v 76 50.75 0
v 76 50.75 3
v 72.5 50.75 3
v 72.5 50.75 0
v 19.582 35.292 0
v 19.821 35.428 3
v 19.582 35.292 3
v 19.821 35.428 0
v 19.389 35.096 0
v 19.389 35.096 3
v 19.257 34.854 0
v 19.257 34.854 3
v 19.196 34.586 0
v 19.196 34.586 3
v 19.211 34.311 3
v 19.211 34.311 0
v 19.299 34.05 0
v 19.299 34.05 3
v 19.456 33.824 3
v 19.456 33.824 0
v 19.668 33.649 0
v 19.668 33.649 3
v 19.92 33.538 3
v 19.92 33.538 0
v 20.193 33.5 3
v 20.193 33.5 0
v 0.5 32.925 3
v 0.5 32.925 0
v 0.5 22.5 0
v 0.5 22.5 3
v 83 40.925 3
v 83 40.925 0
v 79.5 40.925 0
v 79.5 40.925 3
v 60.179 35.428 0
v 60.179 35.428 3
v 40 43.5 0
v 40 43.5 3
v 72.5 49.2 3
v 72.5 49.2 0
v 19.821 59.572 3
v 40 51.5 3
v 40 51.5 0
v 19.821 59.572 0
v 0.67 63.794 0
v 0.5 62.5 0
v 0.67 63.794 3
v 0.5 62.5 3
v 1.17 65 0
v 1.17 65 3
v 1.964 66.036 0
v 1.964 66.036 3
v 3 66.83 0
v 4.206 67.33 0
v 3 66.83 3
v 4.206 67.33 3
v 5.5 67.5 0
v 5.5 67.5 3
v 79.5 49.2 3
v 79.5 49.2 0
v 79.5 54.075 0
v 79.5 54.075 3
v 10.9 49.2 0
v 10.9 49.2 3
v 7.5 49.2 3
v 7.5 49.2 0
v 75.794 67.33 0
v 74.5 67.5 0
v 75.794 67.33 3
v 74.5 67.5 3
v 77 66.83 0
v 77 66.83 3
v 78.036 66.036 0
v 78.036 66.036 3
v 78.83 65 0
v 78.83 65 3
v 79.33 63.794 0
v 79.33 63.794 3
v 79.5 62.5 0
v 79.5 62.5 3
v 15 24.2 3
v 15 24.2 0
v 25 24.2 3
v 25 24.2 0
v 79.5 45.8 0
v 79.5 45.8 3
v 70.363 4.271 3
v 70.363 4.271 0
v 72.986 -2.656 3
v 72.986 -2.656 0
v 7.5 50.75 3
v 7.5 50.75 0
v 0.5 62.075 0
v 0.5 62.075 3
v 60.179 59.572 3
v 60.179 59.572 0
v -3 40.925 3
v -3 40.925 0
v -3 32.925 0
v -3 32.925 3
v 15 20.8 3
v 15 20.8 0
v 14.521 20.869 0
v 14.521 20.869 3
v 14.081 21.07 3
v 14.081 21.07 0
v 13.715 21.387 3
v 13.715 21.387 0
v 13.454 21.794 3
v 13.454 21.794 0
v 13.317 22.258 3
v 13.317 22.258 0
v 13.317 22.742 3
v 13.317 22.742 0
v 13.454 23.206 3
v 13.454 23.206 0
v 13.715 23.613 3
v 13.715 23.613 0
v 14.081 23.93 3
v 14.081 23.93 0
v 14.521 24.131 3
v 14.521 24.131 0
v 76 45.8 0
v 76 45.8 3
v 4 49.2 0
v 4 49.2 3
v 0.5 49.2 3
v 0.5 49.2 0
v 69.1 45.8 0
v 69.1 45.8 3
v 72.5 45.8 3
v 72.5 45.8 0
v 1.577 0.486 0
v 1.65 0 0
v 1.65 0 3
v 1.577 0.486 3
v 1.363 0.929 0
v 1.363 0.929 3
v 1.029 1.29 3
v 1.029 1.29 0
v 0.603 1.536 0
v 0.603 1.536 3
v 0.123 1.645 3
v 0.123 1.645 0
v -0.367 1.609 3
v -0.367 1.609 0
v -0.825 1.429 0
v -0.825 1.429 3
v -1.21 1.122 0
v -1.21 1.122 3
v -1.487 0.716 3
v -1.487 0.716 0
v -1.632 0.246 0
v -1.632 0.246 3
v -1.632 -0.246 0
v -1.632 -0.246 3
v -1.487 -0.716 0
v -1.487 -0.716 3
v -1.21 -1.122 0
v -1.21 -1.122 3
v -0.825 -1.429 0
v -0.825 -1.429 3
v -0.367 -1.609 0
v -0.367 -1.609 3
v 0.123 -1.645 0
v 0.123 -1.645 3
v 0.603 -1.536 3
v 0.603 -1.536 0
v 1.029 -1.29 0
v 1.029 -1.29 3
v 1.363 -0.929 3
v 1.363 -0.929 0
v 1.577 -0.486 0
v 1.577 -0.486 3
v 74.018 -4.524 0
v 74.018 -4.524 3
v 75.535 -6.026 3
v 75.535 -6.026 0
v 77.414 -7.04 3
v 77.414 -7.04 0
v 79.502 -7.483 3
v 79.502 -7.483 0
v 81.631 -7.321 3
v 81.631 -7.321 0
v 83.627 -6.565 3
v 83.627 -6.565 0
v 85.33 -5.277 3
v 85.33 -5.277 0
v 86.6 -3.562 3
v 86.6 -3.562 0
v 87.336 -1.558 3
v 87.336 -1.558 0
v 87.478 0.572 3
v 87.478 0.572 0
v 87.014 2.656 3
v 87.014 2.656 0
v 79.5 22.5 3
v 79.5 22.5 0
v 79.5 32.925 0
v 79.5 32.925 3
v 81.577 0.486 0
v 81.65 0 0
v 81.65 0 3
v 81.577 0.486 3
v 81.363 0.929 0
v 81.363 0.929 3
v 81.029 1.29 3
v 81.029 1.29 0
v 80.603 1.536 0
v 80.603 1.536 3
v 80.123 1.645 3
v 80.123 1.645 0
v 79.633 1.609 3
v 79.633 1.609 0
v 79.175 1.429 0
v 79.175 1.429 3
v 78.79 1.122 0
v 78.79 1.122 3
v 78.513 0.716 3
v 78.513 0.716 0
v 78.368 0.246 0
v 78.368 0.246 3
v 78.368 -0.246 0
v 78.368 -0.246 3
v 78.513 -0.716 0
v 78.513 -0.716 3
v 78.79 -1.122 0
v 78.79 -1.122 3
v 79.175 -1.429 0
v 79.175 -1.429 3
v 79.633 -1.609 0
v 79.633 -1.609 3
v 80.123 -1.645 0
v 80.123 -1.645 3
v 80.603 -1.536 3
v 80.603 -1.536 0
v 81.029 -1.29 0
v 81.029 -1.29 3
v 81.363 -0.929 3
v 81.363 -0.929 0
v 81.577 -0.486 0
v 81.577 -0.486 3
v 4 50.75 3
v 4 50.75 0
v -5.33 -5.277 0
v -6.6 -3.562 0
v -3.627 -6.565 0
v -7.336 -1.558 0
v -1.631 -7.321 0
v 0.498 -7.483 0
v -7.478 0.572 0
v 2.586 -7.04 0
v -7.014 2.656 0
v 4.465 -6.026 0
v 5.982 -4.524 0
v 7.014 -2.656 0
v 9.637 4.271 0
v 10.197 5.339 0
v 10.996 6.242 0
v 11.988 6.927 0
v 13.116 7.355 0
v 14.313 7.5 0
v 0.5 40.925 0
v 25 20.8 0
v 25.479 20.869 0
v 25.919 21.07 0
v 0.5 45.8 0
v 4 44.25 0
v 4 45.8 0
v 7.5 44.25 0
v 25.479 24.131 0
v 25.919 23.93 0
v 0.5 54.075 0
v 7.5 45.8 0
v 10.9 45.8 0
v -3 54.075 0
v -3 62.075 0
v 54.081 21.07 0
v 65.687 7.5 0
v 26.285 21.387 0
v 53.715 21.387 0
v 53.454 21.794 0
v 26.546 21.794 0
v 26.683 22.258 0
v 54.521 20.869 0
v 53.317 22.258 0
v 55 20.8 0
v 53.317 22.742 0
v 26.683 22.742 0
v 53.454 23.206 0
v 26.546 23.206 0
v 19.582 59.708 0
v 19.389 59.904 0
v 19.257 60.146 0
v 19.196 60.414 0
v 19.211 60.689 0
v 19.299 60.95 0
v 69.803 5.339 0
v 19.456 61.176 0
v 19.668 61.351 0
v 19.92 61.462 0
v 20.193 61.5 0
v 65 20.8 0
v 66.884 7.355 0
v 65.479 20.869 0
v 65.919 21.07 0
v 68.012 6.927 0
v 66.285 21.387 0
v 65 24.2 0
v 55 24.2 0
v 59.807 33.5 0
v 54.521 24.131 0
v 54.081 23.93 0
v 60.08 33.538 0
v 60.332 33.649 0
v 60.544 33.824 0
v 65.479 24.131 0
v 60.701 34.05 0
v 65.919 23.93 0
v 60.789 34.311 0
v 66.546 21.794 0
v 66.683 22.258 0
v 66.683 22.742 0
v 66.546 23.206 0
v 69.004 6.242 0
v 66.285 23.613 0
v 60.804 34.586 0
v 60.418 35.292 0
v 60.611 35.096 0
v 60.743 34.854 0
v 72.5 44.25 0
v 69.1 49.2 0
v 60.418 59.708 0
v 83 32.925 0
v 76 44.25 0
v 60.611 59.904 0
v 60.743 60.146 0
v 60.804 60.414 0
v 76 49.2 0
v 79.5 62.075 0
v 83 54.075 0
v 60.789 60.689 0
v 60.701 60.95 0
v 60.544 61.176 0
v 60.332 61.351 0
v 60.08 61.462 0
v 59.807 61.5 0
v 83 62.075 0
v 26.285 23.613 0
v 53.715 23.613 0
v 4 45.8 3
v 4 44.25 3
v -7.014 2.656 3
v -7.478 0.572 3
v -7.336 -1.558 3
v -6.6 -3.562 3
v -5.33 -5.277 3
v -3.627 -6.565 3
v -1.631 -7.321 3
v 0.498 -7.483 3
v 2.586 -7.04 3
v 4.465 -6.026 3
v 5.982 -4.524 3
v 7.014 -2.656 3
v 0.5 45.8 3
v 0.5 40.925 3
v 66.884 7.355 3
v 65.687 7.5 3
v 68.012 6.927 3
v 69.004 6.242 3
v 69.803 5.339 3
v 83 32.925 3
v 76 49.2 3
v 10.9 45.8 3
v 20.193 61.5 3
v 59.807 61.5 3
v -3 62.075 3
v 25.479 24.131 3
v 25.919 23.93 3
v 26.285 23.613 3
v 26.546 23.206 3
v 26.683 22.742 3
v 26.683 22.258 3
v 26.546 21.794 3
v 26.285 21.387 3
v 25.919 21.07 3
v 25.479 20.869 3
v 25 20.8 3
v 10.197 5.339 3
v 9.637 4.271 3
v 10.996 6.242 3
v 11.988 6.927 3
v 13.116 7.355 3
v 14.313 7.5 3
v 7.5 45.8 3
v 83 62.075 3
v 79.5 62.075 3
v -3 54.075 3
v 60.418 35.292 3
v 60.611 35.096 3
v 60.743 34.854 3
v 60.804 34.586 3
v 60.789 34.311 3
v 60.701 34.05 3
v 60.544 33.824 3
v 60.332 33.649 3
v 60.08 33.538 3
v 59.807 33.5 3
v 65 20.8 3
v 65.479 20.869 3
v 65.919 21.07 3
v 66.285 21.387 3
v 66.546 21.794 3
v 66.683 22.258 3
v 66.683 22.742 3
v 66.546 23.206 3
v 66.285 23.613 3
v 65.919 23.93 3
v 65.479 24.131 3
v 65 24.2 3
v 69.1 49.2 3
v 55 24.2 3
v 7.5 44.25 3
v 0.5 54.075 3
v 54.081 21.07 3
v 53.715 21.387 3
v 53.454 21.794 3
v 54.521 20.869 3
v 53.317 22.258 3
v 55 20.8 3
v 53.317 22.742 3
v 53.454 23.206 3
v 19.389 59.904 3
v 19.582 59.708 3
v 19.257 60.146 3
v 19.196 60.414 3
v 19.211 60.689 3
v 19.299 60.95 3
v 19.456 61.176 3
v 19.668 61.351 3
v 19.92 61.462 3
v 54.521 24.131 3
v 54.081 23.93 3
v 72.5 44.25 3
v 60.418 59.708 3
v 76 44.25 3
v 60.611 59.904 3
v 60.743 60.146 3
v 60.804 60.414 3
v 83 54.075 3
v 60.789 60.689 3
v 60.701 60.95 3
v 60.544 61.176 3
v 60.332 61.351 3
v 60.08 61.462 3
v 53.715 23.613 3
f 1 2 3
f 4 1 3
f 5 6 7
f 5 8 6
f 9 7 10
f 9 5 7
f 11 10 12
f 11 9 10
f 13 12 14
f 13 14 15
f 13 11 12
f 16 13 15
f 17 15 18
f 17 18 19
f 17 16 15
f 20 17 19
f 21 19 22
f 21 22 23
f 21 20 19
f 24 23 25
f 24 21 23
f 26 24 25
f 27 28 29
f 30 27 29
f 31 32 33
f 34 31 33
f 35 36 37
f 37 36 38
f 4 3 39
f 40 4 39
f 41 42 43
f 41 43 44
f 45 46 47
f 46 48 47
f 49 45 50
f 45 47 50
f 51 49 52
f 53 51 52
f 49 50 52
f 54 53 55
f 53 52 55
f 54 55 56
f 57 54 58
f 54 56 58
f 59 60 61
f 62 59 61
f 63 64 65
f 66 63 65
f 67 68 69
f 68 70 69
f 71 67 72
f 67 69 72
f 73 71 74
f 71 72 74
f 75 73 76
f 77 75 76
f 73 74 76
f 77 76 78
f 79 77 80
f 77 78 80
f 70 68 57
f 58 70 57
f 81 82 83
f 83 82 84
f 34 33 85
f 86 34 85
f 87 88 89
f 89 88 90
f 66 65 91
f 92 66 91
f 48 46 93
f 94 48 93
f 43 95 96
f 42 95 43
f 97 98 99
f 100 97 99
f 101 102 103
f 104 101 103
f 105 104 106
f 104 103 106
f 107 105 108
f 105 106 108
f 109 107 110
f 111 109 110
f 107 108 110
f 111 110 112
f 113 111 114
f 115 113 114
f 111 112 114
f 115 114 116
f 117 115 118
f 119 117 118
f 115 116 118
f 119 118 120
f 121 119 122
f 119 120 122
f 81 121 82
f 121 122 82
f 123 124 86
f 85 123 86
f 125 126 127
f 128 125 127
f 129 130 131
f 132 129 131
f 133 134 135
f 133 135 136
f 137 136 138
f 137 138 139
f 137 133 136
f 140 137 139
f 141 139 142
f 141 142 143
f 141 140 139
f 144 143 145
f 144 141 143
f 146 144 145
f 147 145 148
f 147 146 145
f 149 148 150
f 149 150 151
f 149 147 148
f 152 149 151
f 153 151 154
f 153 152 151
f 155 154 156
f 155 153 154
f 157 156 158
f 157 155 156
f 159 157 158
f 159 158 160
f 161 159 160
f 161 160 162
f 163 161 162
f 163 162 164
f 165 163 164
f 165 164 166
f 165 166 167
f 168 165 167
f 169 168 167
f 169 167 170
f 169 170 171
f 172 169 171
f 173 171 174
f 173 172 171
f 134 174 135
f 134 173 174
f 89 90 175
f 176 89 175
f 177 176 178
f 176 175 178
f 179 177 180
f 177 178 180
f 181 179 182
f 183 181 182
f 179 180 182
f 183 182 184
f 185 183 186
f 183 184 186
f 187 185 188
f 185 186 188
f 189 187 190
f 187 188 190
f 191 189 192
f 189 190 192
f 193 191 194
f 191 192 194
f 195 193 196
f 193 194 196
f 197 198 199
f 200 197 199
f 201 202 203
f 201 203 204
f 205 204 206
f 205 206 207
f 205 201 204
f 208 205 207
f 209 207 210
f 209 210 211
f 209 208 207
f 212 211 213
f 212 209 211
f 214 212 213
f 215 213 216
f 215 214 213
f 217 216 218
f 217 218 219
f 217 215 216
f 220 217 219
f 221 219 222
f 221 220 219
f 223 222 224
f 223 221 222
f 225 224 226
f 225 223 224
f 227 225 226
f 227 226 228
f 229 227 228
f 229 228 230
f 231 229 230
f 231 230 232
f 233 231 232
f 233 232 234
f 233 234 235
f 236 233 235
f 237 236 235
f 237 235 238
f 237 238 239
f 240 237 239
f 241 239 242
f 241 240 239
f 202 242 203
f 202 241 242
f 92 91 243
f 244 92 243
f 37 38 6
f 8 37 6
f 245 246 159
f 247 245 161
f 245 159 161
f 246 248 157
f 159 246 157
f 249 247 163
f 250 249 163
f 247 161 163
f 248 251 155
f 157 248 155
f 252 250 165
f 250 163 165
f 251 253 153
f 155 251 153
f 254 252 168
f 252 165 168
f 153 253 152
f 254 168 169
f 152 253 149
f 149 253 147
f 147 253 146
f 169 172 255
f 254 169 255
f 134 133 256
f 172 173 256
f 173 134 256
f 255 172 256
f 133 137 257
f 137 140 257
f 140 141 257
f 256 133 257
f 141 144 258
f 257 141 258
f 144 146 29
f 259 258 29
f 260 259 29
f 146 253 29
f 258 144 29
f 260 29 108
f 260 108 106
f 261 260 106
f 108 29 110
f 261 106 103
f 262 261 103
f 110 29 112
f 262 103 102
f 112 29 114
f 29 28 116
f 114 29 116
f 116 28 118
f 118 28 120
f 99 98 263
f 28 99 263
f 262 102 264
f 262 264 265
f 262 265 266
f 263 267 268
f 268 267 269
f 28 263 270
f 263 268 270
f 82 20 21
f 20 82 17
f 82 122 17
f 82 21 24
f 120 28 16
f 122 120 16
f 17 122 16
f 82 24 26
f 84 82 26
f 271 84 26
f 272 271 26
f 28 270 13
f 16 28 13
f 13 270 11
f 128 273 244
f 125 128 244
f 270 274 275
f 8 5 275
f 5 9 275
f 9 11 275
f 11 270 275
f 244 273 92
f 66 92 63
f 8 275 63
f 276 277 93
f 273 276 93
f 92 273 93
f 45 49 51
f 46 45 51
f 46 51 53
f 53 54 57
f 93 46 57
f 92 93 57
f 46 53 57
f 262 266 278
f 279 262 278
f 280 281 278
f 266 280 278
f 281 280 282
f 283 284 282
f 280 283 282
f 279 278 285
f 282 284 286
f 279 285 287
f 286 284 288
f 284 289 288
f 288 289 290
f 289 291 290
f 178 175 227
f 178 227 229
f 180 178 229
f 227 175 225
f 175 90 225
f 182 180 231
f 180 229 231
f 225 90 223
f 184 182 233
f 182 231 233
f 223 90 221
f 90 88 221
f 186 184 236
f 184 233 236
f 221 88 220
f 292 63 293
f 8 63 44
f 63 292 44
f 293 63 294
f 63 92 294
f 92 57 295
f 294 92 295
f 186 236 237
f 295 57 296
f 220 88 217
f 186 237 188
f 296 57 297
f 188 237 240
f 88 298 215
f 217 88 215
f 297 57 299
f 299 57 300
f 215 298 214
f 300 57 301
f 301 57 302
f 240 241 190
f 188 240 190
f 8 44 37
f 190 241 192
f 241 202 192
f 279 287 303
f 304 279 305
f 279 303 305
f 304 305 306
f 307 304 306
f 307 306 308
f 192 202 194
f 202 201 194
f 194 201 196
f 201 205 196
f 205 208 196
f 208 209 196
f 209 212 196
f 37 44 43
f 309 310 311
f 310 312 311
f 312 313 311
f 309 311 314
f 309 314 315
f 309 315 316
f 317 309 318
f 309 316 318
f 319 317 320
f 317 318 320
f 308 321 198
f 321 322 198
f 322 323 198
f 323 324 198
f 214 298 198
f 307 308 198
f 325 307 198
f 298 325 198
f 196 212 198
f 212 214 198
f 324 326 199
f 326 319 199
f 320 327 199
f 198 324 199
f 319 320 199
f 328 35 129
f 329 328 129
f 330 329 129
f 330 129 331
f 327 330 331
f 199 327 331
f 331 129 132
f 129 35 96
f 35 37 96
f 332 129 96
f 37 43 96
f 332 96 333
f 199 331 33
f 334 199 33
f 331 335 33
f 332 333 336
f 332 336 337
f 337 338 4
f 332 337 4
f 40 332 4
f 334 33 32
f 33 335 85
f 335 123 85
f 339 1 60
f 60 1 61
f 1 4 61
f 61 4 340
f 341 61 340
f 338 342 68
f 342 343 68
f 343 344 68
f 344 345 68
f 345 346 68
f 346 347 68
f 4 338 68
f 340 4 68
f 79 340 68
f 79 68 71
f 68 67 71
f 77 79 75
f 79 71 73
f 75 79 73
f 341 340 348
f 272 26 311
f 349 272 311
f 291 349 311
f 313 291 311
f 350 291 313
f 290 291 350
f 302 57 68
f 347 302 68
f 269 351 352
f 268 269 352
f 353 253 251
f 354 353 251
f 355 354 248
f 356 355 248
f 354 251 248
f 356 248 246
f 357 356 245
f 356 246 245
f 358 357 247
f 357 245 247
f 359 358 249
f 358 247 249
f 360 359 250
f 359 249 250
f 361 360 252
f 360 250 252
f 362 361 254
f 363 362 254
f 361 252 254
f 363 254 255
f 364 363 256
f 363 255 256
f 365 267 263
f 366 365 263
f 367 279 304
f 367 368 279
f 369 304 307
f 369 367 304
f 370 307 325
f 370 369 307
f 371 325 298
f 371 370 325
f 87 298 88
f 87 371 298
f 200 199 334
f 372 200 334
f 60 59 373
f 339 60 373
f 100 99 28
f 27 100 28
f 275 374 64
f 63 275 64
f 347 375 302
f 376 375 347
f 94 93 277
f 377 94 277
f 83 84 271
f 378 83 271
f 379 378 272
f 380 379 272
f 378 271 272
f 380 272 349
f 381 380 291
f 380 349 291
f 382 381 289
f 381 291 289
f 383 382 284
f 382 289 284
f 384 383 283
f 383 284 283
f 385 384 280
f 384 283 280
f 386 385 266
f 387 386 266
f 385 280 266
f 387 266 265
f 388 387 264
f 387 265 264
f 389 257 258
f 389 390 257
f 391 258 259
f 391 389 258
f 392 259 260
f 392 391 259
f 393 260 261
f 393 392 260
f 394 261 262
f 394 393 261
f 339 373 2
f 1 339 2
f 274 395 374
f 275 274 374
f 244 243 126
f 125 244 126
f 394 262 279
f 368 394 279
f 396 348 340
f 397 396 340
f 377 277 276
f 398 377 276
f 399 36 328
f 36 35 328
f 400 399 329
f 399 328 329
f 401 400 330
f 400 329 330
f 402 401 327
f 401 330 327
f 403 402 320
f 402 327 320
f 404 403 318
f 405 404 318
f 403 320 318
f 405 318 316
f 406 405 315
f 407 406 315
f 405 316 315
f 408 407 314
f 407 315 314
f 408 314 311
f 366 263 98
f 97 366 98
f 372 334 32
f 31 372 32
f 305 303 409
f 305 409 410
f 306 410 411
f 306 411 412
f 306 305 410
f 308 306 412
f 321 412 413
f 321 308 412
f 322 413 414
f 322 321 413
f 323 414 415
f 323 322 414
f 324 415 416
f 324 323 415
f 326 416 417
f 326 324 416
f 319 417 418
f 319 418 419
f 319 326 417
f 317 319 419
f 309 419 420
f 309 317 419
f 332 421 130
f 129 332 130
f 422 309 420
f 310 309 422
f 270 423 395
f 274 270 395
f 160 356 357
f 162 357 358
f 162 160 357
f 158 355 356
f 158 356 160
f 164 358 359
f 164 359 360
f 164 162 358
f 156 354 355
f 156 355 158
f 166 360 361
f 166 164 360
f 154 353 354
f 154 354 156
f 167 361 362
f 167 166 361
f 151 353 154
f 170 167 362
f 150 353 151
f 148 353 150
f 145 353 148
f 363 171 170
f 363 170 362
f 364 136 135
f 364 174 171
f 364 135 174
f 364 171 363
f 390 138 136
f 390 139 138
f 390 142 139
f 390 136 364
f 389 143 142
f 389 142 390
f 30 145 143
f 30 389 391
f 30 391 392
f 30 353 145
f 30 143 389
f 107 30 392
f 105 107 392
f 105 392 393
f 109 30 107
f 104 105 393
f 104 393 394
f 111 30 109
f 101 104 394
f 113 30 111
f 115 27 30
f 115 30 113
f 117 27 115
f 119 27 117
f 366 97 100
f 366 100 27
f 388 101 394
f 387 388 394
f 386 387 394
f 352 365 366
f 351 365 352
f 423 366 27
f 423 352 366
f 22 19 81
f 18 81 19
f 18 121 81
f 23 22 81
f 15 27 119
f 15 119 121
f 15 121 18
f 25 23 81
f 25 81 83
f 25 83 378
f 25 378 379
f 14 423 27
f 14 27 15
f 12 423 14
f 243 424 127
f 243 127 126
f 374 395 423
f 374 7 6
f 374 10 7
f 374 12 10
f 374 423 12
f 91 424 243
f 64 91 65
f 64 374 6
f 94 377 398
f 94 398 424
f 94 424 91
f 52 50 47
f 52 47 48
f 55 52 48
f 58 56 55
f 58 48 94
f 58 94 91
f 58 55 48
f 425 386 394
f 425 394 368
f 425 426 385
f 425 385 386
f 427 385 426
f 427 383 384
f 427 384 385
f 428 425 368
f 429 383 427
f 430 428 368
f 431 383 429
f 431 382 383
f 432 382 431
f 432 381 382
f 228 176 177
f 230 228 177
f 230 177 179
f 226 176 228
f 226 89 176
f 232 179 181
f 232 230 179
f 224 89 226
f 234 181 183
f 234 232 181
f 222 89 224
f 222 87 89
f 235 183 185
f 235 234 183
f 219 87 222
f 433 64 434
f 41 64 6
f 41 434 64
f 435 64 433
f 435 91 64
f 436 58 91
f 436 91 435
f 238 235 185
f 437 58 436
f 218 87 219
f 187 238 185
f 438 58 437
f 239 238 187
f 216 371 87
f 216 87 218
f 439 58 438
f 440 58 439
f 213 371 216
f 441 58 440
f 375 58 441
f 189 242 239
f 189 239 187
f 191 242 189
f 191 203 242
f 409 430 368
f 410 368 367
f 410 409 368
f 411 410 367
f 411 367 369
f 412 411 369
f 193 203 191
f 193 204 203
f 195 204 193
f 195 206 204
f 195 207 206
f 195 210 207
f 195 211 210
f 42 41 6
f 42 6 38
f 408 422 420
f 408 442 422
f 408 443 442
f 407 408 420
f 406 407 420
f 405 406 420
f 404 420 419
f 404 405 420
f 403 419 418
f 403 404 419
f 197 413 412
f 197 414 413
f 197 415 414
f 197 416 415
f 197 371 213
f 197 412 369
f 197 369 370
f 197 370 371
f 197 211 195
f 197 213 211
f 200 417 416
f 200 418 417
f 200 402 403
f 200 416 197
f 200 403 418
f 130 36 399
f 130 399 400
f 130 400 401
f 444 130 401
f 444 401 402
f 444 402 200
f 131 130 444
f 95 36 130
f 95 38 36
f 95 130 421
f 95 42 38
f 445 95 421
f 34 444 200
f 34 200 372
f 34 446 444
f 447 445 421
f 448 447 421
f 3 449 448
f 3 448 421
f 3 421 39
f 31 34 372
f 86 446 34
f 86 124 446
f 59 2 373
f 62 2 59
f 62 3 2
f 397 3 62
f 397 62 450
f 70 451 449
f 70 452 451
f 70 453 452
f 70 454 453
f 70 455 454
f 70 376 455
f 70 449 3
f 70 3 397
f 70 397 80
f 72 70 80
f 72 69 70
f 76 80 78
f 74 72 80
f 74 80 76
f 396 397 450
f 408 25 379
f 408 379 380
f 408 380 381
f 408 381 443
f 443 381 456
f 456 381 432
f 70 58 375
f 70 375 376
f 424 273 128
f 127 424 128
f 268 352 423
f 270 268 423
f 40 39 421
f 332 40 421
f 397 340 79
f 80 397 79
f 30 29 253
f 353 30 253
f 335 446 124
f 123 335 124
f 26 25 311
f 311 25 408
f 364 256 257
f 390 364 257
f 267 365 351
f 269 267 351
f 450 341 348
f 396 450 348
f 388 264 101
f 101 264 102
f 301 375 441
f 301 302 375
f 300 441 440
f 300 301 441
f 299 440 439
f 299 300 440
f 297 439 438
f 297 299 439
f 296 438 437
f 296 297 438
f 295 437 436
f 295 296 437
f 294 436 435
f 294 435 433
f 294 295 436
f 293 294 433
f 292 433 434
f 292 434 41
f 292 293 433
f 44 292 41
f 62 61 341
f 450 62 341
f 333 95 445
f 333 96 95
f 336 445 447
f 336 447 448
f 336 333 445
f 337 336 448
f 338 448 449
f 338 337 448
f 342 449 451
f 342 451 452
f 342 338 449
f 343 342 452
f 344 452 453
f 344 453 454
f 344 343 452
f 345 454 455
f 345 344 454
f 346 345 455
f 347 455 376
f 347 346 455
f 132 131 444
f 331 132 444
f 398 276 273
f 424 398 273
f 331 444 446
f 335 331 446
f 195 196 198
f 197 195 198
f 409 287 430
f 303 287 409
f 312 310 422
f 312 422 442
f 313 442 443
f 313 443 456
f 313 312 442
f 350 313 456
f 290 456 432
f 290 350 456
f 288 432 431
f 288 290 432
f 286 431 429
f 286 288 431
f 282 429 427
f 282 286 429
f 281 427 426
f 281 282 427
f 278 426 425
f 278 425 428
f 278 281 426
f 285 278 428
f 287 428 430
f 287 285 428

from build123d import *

# Parameters (mm, degrees)
SKETCH_1_R          = 1.65
EXTRUDE_1_DEPTH     = 3
FILLET_1_R          = 5
CUT_EXTRUDE_1_DEPTH = 111.550893257
FILLET_2_R          = 1


with BuildPart() as part:
    # 草图1 → 凸台-拉伸1 (new body)
    with BuildSketch(Plane.XY):
        with BuildLine():
            Line((7.014012459, -2.655866944), (10.859547587, 7.5))
            Line((10.859547587, 7.5), (69.140452413, 7.5))
            Line((69.140452413, 7.5), (72.985987541, -2.655866944))
            ThreePointArc((72.985987541, -2.655866944), (82.655866944, -7.014012459), (87.014012459, 2.655866944))
            Line((87.014012459, 2.655866944), (79.5, 22.5))
            Line((79.5, 22.5), (79.5, 32.925))
            Line((79.5, 32.925), (83, 32.925))
            Line((83, 32.925), (83, 40.925))
            Line((83, 40.925), (79.5, 40.925))
            Line((79.5, 40.925), (79.5, 54.075))
            Line((79.5, 54.075), (83, 54.075))
            Line((83, 54.075), (83, 62.075))
            Line((83, 62.075), (79.5, 62.075))
            Line((79.5, 62.075), (79.5, 67.5))
            Line((79.5, 67.5), (0.5, 67.5))
            Line((0.5, 67.5), (0.5, 62.075))
            Line((0.5, 62.075), (-3, 62.075))
            Line((-3, 62.075), (-3, 54.075))
            Line((-3, 54.075), (0.5, 54.075))
            Line((0.5, 54.075), (0.5, 40.925))
            Line((0.5, 40.925), (-3, 40.925))
            Line((-3, 40.925), (-3, 32.925))
            Line((-3, 32.925), (0.5, 32.925))
            Line((0.5, 32.925), (0.5, 22.5))
            Line((0.5, 22.5), (-7.014012459, 2.655866944))
            ThreePointArc((-7.014012459, 2.655866944), (-2.655866944, -7.014012459), (7.014012459, -2.655866944))
        make_face()
        Circle(SKETCH_1_R, mode=Mode.SUBTRACT)
        with Locations((80, 0)):
            Circle(SKETCH_1_R, mode=Mode.SUBTRACT)
        with BuildLine():
            Line((15, 24.2), (25, 24.2))
            ThreePointArc((25, 24.2), (26.7, 22.5), (25, 20.8))
            Line((25, 20.8), (15, 20.8))
            ThreePointArc((15, 20.8), (13.3, 22.5), (15, 24.2))
        make_face(mode=Mode.SUBTRACT)
        with BuildLine():
            Line((65, 24.2), (55, 24.2))
            ThreePointArc((55, 24.2), (53.3, 22.5), (55, 20.8))
            Line((55, 20.8), (65, 20.8))
            ThreePointArc((65, 20.8), (66.7, 22.5), (65, 24.2))
        make_face(mode=Mode.SUBTRACT)
    extrude(amount=EXTRUDE_1_DEPTH)

    # 圆角1
    fillet_1_edges = [part.edges().sort_by_distance(p)[0] for p in [
        (69.140452413, 7.5, 1.5),
        (10.859547587, 7.5, 1.5),
        (0.5, 67.5, 1.5),
        (79.5, 67.5, 1.5),
    ]]
    fillet(fillet_1_edges, radius=FILLET_1_R)

    # 草图3 → 切除-拉伸1 (cut, through all)
    with BuildSketch(Plane.XY.offset(3)):
        Polygon((0.5, 45.8), (4, 45.8), (4, 44.25), (7.5, 44.25), (7.5, 45.8), (10.9, 45.8), (10.9, 49.2), (7.5, 49.2), (7.5, 50.75), (4, 50.75), (4, 49.2), (0.5, 49.2), align=None)
        Polygon((79.5, 49.2), (76, 49.2), (76, 50.75), (72.5, 50.75), (72.5, 49.2), (69.1, 49.2), (69.1, 45.8), (72.5, 45.8), (72.5, 44.25), (76, 44.25), (76, 45.8), (79.5, 45.8), align=None)
        Polygon((40, 51.5), (15, 61.5), (65, 61.5), align=None)
        Polygon((65, 33.5), (40, 43.5), (15, 33.5), align=None)
    extrude(amount=-CUT_EXTRUDE_1_DEPTH, mode=Mode.SUBTRACT)

    # 圆角2
    fillet_2_edges = [part.edges().sort_by_distance(p)[0] for p in [
        (65, 61.5, 1.5),
        (15, 61.5, 1.5),
        (65, 33.5, 1.5),
        (15, 33.5, 1.5),
    ]]
    fillet(fillet_2_edges, radius=FILLET_2_R)


solid = part.part
